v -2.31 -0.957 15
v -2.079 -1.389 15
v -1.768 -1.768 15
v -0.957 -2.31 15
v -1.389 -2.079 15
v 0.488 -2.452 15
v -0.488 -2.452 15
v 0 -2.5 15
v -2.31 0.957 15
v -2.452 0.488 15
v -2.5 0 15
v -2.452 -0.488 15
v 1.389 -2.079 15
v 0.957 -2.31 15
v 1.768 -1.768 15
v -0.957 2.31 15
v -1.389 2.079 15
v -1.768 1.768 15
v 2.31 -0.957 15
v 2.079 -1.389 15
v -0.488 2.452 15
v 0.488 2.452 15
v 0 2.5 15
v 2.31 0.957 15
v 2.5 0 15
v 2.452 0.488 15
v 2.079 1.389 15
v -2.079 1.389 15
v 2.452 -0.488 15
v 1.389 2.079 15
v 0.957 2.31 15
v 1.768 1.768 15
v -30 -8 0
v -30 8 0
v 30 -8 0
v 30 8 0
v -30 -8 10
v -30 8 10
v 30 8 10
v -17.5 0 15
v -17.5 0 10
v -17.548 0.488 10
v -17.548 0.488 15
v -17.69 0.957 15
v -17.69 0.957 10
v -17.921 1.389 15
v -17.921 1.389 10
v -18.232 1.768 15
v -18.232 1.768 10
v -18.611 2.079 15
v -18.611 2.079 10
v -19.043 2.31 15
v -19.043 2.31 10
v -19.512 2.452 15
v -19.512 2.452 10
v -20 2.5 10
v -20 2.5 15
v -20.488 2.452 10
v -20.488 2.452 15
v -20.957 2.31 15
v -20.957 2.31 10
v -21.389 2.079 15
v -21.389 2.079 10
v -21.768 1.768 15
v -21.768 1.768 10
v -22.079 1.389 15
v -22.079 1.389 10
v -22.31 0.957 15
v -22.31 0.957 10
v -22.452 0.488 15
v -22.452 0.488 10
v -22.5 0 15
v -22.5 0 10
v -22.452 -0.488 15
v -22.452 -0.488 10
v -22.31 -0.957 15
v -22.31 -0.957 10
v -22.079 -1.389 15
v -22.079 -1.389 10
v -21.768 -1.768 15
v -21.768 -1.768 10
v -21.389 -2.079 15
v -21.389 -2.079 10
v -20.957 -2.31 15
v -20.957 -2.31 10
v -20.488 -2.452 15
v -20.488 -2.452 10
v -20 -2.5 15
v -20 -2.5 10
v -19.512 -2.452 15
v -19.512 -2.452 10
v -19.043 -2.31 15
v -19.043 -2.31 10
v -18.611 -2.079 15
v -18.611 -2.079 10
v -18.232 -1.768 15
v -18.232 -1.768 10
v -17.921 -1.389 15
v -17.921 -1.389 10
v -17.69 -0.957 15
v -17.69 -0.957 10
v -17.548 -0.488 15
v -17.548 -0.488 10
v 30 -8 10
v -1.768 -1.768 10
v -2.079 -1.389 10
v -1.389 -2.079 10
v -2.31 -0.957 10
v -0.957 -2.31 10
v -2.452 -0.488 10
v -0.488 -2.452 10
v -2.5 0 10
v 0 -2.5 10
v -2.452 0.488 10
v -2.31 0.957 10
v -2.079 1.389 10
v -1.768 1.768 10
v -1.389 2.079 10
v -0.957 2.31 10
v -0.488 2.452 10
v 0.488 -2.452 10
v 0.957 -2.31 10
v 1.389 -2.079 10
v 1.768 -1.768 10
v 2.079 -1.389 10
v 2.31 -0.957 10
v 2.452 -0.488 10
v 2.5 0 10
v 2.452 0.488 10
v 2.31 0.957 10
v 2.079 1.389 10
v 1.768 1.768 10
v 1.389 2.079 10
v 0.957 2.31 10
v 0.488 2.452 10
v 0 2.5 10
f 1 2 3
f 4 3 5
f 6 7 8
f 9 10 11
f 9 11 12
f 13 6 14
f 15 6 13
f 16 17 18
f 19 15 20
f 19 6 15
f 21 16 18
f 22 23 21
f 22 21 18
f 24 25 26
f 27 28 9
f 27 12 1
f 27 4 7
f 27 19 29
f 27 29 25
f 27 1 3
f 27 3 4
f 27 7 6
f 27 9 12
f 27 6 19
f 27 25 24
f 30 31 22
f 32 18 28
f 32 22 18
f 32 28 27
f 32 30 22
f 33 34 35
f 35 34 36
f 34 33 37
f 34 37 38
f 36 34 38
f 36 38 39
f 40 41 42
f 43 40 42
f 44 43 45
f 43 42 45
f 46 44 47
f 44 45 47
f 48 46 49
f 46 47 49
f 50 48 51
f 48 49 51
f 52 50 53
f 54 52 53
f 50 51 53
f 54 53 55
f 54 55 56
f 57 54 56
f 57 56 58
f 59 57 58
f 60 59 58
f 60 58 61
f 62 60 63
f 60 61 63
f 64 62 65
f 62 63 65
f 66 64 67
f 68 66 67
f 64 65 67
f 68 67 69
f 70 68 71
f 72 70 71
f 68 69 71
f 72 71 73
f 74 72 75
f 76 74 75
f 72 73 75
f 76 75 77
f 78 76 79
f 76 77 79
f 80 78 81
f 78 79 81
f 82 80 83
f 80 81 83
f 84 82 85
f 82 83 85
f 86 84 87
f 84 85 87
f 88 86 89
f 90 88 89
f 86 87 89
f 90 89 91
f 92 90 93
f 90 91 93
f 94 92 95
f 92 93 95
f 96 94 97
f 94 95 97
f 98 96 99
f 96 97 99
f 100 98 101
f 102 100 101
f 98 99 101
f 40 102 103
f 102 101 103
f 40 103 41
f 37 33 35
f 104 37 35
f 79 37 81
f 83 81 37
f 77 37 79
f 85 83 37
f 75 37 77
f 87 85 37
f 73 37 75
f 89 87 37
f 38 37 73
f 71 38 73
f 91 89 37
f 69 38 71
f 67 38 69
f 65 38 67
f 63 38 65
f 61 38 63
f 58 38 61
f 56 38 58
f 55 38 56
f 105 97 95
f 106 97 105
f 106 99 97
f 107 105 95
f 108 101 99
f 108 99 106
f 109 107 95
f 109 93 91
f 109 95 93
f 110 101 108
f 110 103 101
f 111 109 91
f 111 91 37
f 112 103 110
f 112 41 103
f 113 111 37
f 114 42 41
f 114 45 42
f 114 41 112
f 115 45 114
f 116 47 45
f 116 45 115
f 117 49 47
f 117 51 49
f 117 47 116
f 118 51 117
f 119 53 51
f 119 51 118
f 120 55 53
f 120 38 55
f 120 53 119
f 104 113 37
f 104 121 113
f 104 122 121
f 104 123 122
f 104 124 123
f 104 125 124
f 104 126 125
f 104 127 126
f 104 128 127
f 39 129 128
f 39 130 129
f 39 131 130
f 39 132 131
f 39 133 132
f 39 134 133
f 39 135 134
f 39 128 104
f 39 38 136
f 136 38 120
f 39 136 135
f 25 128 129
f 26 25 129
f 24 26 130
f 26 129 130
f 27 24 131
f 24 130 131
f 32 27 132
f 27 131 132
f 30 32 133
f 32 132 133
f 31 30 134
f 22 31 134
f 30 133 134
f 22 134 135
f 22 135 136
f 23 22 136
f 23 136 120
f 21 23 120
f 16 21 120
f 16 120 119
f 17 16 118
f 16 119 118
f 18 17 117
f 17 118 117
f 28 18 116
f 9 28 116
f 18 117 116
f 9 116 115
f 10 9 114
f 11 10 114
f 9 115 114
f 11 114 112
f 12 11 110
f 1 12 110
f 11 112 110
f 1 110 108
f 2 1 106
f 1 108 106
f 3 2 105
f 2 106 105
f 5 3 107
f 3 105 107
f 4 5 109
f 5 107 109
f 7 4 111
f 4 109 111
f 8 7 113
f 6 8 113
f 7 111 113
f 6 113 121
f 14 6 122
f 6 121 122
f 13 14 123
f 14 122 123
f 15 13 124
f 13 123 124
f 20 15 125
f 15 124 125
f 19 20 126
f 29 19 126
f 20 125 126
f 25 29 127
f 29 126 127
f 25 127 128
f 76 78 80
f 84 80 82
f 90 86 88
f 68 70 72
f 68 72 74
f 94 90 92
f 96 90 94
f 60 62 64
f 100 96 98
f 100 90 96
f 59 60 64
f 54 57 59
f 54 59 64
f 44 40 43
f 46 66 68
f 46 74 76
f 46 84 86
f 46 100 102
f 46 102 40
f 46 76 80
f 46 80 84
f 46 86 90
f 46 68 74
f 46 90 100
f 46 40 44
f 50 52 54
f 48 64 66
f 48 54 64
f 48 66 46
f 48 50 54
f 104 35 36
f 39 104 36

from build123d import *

# Parameters (mm, degrees)
F0_W     = 60
F0_H     = 16
F1_DEPTH = 10
F2_R     = 2.5
F3_DEPTH = 5
F4_DEPTH = 5


with BuildPart() as f1:
    # F0 (on Top) → F1 (new body)
    with BuildSketch(Plane.XY):
        Rectangle(F0_W, F0_H)
    extrude(amount=F1_DEPTH)

    # F2 (on face) → F3 (join)
    with BuildSketch(Plane.XY.offset(10)):
        Circle(F2_R)
    extrude(amount=F3_DEPTH)

    # F2 (on face) → F4 (join)
    with BuildSketch(Plane.XY.offset(10)):
        with Locations((-20, 0)):
            Circle(F2_R)
        Circle(F2_R)
    extrude(amount=F4_DEPTH)


solid = f1.part
